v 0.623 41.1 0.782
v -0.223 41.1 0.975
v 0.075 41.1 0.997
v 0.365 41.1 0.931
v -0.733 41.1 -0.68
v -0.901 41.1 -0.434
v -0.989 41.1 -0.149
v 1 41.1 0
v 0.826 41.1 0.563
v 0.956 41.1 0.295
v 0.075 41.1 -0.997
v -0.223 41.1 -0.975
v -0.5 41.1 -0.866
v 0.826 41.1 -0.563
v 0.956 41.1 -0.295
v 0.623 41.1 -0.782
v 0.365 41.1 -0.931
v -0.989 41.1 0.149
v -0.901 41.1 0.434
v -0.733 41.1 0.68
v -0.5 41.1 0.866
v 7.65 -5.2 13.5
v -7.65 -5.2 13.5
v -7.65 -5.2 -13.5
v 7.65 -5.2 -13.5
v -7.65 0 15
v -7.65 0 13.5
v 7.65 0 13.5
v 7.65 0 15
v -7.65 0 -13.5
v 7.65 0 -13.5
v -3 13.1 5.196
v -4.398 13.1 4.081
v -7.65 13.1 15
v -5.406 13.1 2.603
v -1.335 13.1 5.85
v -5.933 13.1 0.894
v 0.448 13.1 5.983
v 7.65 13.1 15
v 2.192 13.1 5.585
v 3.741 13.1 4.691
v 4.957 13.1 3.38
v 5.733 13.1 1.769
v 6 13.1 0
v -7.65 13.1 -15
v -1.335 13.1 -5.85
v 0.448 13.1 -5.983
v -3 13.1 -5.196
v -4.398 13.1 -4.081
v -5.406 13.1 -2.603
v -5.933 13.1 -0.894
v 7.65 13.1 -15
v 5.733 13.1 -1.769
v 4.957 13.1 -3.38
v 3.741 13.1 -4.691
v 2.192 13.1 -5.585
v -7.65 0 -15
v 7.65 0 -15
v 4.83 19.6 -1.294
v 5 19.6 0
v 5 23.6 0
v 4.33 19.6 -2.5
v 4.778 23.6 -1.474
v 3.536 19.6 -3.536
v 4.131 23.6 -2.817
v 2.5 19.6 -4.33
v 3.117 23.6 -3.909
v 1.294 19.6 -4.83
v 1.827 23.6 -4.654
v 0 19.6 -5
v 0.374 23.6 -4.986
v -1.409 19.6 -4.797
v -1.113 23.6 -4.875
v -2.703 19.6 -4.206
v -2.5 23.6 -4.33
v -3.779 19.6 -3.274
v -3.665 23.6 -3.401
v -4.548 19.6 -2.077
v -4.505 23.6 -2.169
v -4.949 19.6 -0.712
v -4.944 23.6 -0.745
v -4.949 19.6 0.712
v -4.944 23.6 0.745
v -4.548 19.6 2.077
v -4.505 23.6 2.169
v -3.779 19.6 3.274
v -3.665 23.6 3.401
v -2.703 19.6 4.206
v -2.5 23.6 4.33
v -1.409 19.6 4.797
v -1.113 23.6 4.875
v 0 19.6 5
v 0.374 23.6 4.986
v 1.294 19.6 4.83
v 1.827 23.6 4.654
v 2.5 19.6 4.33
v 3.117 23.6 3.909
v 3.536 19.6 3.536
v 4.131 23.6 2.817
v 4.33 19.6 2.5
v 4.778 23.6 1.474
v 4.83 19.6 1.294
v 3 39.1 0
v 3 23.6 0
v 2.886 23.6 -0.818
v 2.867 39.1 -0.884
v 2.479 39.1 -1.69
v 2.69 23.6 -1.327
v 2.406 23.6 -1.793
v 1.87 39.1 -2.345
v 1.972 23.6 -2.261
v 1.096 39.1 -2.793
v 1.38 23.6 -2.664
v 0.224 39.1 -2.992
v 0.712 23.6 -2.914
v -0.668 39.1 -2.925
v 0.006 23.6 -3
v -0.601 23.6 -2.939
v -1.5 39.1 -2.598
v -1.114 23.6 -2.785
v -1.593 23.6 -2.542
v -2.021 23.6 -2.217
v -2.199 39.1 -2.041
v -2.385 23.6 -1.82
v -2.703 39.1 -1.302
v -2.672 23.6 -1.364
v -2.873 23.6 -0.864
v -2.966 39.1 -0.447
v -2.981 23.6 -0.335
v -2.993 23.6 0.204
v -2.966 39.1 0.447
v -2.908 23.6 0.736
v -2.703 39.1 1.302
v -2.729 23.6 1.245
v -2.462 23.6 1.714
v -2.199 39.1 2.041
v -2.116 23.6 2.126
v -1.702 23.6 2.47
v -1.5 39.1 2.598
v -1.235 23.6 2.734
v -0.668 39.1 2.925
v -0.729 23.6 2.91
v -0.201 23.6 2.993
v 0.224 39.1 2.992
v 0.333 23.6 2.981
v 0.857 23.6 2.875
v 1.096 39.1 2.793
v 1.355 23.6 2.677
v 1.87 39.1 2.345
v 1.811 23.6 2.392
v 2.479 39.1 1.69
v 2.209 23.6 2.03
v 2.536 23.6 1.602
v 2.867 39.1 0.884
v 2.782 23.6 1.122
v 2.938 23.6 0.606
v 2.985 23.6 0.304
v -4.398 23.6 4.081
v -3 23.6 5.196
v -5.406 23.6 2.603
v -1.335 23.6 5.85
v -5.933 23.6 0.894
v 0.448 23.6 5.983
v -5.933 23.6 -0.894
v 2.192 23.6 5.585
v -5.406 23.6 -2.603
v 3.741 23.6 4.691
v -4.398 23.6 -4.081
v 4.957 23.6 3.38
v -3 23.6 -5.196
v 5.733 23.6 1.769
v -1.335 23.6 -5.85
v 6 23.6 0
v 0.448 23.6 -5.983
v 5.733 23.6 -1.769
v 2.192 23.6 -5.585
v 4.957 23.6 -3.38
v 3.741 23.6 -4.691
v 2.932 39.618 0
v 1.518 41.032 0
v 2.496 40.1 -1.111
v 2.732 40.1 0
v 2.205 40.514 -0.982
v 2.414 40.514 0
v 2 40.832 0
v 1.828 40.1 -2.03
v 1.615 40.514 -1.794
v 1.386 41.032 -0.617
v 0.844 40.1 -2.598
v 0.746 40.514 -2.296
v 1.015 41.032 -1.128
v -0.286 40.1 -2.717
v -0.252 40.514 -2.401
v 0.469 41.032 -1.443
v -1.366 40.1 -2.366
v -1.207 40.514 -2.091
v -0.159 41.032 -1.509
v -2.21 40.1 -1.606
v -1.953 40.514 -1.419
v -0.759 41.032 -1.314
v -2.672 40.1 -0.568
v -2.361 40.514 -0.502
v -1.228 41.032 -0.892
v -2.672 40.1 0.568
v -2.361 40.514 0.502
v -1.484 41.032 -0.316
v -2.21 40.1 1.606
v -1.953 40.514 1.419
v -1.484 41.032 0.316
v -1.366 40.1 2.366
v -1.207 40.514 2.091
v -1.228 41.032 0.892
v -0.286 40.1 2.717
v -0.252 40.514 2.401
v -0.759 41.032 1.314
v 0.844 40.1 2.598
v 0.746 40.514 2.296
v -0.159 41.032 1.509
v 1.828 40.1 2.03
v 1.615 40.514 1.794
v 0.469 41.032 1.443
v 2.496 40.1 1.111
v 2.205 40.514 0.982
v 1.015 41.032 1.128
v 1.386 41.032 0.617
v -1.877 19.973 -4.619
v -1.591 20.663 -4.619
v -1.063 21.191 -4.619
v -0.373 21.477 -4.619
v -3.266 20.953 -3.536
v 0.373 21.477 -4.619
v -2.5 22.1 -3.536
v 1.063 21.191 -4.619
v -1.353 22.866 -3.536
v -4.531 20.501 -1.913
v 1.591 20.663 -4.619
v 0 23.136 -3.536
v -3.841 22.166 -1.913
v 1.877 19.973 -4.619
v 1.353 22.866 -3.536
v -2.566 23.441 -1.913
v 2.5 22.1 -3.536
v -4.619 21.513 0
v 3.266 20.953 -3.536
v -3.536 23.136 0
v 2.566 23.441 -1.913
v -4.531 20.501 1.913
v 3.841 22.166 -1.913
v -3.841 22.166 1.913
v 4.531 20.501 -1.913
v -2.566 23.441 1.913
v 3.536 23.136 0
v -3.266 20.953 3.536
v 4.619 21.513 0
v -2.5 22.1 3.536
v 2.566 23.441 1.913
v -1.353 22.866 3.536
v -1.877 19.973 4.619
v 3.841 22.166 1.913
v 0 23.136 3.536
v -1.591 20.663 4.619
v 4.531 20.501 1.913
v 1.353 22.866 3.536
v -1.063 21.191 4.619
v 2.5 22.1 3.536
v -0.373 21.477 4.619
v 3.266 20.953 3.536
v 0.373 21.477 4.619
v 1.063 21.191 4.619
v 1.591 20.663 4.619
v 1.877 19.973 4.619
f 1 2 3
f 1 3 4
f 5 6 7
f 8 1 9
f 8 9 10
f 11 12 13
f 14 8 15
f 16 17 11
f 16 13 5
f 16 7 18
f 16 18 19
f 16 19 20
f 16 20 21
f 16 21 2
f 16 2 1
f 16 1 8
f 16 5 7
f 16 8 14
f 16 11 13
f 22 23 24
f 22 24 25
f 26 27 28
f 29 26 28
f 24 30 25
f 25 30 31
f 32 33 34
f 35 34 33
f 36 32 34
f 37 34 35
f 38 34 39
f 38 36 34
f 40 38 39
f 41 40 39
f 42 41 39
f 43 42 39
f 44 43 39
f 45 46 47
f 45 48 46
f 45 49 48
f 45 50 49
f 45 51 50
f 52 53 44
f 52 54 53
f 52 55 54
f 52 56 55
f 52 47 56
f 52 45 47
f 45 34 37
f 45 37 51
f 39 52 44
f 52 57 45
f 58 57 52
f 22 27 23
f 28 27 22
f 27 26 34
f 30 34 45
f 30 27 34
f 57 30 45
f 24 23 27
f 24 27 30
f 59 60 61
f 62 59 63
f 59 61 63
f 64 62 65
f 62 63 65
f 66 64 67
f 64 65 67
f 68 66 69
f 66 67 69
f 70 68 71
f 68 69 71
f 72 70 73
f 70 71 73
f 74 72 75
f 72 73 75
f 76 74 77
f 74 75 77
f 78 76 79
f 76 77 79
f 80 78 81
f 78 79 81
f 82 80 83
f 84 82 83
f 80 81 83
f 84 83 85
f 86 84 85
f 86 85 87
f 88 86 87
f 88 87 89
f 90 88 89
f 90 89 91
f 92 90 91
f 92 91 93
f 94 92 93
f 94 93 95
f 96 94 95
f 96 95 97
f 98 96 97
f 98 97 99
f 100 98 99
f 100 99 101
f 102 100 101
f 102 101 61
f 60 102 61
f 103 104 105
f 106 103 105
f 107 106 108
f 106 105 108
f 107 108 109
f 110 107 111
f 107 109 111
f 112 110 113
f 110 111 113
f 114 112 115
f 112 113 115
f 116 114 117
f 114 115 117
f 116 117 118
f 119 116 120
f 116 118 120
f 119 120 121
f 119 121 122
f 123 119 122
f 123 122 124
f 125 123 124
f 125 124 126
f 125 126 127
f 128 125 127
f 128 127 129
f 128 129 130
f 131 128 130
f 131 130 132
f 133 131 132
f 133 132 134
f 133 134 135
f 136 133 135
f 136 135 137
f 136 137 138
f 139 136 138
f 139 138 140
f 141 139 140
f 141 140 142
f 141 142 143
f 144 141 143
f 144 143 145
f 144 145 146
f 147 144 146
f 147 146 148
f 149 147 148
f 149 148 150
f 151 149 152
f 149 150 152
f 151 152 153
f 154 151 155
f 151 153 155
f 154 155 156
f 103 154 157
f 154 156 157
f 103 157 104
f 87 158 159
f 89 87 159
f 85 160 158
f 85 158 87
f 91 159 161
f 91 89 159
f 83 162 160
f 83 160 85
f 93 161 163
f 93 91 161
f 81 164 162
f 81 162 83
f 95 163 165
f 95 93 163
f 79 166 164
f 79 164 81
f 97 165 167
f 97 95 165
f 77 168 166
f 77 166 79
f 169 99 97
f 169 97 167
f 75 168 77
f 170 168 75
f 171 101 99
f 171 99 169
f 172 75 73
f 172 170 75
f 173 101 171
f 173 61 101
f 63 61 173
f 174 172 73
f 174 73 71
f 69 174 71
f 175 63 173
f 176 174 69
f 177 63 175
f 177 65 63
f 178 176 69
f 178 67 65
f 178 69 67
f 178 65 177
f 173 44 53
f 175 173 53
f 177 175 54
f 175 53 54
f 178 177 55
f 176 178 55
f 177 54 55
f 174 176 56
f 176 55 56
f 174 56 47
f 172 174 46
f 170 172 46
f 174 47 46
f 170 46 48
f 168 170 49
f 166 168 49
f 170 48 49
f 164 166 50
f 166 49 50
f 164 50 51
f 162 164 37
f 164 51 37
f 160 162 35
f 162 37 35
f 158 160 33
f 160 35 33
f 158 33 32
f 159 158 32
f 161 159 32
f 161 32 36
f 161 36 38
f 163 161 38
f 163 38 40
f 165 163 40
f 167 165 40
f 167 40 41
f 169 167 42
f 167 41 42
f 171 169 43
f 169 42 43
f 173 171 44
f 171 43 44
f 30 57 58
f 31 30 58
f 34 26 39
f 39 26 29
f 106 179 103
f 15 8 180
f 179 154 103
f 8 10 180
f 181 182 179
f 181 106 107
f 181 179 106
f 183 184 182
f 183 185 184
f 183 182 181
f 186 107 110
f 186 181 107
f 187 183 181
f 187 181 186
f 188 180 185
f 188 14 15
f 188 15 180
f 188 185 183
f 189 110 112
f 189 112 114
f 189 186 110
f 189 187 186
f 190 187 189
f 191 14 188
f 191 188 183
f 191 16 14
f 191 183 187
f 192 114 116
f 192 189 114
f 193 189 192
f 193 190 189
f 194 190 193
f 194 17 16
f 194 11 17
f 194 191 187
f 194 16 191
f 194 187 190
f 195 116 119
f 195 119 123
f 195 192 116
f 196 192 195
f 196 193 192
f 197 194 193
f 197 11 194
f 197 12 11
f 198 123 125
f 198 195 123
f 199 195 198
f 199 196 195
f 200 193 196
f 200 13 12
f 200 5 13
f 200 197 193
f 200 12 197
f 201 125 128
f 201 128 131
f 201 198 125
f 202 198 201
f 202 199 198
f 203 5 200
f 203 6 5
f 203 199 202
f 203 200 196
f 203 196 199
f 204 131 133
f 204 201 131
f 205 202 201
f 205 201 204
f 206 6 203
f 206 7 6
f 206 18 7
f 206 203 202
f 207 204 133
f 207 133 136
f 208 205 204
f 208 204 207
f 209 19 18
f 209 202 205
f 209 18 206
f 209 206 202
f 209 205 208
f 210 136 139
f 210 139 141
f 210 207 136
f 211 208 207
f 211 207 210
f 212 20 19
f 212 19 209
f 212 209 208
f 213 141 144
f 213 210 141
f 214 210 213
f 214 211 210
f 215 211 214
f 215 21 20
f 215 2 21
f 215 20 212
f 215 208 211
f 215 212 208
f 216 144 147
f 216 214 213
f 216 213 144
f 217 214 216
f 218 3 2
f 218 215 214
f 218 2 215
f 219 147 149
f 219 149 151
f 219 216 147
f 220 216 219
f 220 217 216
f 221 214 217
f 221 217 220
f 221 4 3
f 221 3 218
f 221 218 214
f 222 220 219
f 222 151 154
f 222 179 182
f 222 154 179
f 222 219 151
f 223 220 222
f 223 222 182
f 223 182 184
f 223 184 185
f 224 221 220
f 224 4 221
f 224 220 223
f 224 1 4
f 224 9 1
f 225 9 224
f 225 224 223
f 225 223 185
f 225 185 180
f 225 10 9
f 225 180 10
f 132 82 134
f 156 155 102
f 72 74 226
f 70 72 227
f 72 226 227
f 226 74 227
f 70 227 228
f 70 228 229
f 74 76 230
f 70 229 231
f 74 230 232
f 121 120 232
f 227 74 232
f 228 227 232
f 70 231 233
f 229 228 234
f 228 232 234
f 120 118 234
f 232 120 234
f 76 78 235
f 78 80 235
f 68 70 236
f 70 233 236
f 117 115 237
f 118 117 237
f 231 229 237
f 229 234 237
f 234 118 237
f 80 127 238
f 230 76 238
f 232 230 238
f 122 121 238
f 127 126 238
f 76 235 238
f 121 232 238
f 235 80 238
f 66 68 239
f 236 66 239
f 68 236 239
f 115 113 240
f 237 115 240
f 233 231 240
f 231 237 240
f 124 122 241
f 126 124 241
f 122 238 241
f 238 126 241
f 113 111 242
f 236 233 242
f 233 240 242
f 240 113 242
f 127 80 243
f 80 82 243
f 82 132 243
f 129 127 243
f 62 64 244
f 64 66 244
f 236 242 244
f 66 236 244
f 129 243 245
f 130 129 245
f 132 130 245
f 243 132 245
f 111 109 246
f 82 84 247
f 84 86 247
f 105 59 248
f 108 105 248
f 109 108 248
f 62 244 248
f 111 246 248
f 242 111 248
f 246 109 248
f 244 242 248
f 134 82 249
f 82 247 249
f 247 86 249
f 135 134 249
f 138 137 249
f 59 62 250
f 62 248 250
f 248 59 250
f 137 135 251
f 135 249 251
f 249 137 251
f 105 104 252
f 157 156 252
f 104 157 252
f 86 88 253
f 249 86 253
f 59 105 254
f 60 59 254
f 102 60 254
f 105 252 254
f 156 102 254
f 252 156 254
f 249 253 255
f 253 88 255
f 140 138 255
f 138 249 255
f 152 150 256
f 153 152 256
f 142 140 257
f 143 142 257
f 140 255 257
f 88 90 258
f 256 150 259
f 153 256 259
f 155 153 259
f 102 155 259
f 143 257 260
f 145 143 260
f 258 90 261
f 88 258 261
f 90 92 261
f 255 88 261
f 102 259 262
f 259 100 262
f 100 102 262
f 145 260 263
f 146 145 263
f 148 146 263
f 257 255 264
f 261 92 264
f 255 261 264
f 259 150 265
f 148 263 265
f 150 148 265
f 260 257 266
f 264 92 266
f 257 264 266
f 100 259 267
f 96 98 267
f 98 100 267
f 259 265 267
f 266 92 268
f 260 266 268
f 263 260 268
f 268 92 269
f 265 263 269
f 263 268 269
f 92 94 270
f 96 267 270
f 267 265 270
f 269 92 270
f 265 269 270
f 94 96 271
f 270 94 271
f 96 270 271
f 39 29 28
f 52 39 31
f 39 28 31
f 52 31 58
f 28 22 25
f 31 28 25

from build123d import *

# Parameters (mm, degrees)
SKETCH1_W           = 15.3
SKETCH1_H           = 30
BOSS_EXTRUDE1_DEPTH = 13.1
SKETCH2_R           = 6
BOSS_EXTRUDE2_DEPTH = 10.5
SKETCH4_R           = 5
CUT_EXTRUDE1_DEPTH  = 4
SKETCH5_R           = 3
BOSS_EXTRUDE3_DEPTH = 21.5
REVOLVE2_ANGLE      = 180
FILLET1_R           = 2
SKETCH6_W           = 15.3
SKETCH6_H           = 27
BOSS_EXTRUDE4_DEPTH = 5.2


with BuildPart() as part:
    # Sketch1 → Boss-Extrude1 (new body)
    with BuildSketch(Plane(origin=(0, 0, 0), x_dir=(1, 0, 0), z_dir=(0, 1, 0))):
        Rectangle(SKETCH1_W, SKETCH1_H)
    extrude(amount=BOSS_EXTRUDE1_DEPTH)

    # Sketch2 → Boss-Extrude2 (add)
    with BuildSketch(Plane(origin=(0, 13.1, 0), x_dir=(1, 0, 0), z_dir=(0, 1, 0))):
        Circle(SKETCH2_R)
    extrude(amount=BOSS_EXTRUDE2_DEPTH)

    # Sketch4 → Cut-Extrude1 (cut)
    with BuildSketch(Plane(origin=(0, 23.6, 0), x_dir=(1, 0, 0), z_dir=(0, 1, 0))):
        Circle(SKETCH4_R)
    extrude(amount=-CUT_EXTRUDE1_DEPTH, mode=Mode.SUBTRACT)

    # Sketch5 → Boss-Extrude3 (add)
    with BuildSketch(Plane(origin=(0, 19.6, 0), x_dir=(1, 0, 0), z_dir=(0, 1, 0))):
        Circle(SKETCH5_R)
    extrude(amount=BOSS_EXTRUDE3_DEPTH)

    # Sketch3 → Revolve2 (revolve)
    with BuildSketch(Plane(origin=(0, 19.6, 0), x_dir=(1, 0, 0), z_dir=(0, 1, 0))):
        with BuildLine():
            Line((0, -5), (0, 5))
            ThreePointArc((0, 5), (-5, 0), (0, -5))
        make_face()
    revolve(axis=Axis((0, 19.6, 6), (0, 0, -1)), revolution_arc=REVOLVE2_ANGLE)

    # Fillet1
    fillet1_edges = [part.edges().sort_by_distance(p)[0] for p in [
        (-3, 41.1, 0),
    ]]
    fillet(fillet1_edges, radius=FILLET1_R)

    # Sketch6 → Boss-Extrude4 (add)
    with BuildSketch(Plane.XZ):
        Rectangle(SKETCH6_W, SKETCH6_H)
    extrude(amount=BOSS_EXTRUDE4_DEPTH)


solid = part.part
